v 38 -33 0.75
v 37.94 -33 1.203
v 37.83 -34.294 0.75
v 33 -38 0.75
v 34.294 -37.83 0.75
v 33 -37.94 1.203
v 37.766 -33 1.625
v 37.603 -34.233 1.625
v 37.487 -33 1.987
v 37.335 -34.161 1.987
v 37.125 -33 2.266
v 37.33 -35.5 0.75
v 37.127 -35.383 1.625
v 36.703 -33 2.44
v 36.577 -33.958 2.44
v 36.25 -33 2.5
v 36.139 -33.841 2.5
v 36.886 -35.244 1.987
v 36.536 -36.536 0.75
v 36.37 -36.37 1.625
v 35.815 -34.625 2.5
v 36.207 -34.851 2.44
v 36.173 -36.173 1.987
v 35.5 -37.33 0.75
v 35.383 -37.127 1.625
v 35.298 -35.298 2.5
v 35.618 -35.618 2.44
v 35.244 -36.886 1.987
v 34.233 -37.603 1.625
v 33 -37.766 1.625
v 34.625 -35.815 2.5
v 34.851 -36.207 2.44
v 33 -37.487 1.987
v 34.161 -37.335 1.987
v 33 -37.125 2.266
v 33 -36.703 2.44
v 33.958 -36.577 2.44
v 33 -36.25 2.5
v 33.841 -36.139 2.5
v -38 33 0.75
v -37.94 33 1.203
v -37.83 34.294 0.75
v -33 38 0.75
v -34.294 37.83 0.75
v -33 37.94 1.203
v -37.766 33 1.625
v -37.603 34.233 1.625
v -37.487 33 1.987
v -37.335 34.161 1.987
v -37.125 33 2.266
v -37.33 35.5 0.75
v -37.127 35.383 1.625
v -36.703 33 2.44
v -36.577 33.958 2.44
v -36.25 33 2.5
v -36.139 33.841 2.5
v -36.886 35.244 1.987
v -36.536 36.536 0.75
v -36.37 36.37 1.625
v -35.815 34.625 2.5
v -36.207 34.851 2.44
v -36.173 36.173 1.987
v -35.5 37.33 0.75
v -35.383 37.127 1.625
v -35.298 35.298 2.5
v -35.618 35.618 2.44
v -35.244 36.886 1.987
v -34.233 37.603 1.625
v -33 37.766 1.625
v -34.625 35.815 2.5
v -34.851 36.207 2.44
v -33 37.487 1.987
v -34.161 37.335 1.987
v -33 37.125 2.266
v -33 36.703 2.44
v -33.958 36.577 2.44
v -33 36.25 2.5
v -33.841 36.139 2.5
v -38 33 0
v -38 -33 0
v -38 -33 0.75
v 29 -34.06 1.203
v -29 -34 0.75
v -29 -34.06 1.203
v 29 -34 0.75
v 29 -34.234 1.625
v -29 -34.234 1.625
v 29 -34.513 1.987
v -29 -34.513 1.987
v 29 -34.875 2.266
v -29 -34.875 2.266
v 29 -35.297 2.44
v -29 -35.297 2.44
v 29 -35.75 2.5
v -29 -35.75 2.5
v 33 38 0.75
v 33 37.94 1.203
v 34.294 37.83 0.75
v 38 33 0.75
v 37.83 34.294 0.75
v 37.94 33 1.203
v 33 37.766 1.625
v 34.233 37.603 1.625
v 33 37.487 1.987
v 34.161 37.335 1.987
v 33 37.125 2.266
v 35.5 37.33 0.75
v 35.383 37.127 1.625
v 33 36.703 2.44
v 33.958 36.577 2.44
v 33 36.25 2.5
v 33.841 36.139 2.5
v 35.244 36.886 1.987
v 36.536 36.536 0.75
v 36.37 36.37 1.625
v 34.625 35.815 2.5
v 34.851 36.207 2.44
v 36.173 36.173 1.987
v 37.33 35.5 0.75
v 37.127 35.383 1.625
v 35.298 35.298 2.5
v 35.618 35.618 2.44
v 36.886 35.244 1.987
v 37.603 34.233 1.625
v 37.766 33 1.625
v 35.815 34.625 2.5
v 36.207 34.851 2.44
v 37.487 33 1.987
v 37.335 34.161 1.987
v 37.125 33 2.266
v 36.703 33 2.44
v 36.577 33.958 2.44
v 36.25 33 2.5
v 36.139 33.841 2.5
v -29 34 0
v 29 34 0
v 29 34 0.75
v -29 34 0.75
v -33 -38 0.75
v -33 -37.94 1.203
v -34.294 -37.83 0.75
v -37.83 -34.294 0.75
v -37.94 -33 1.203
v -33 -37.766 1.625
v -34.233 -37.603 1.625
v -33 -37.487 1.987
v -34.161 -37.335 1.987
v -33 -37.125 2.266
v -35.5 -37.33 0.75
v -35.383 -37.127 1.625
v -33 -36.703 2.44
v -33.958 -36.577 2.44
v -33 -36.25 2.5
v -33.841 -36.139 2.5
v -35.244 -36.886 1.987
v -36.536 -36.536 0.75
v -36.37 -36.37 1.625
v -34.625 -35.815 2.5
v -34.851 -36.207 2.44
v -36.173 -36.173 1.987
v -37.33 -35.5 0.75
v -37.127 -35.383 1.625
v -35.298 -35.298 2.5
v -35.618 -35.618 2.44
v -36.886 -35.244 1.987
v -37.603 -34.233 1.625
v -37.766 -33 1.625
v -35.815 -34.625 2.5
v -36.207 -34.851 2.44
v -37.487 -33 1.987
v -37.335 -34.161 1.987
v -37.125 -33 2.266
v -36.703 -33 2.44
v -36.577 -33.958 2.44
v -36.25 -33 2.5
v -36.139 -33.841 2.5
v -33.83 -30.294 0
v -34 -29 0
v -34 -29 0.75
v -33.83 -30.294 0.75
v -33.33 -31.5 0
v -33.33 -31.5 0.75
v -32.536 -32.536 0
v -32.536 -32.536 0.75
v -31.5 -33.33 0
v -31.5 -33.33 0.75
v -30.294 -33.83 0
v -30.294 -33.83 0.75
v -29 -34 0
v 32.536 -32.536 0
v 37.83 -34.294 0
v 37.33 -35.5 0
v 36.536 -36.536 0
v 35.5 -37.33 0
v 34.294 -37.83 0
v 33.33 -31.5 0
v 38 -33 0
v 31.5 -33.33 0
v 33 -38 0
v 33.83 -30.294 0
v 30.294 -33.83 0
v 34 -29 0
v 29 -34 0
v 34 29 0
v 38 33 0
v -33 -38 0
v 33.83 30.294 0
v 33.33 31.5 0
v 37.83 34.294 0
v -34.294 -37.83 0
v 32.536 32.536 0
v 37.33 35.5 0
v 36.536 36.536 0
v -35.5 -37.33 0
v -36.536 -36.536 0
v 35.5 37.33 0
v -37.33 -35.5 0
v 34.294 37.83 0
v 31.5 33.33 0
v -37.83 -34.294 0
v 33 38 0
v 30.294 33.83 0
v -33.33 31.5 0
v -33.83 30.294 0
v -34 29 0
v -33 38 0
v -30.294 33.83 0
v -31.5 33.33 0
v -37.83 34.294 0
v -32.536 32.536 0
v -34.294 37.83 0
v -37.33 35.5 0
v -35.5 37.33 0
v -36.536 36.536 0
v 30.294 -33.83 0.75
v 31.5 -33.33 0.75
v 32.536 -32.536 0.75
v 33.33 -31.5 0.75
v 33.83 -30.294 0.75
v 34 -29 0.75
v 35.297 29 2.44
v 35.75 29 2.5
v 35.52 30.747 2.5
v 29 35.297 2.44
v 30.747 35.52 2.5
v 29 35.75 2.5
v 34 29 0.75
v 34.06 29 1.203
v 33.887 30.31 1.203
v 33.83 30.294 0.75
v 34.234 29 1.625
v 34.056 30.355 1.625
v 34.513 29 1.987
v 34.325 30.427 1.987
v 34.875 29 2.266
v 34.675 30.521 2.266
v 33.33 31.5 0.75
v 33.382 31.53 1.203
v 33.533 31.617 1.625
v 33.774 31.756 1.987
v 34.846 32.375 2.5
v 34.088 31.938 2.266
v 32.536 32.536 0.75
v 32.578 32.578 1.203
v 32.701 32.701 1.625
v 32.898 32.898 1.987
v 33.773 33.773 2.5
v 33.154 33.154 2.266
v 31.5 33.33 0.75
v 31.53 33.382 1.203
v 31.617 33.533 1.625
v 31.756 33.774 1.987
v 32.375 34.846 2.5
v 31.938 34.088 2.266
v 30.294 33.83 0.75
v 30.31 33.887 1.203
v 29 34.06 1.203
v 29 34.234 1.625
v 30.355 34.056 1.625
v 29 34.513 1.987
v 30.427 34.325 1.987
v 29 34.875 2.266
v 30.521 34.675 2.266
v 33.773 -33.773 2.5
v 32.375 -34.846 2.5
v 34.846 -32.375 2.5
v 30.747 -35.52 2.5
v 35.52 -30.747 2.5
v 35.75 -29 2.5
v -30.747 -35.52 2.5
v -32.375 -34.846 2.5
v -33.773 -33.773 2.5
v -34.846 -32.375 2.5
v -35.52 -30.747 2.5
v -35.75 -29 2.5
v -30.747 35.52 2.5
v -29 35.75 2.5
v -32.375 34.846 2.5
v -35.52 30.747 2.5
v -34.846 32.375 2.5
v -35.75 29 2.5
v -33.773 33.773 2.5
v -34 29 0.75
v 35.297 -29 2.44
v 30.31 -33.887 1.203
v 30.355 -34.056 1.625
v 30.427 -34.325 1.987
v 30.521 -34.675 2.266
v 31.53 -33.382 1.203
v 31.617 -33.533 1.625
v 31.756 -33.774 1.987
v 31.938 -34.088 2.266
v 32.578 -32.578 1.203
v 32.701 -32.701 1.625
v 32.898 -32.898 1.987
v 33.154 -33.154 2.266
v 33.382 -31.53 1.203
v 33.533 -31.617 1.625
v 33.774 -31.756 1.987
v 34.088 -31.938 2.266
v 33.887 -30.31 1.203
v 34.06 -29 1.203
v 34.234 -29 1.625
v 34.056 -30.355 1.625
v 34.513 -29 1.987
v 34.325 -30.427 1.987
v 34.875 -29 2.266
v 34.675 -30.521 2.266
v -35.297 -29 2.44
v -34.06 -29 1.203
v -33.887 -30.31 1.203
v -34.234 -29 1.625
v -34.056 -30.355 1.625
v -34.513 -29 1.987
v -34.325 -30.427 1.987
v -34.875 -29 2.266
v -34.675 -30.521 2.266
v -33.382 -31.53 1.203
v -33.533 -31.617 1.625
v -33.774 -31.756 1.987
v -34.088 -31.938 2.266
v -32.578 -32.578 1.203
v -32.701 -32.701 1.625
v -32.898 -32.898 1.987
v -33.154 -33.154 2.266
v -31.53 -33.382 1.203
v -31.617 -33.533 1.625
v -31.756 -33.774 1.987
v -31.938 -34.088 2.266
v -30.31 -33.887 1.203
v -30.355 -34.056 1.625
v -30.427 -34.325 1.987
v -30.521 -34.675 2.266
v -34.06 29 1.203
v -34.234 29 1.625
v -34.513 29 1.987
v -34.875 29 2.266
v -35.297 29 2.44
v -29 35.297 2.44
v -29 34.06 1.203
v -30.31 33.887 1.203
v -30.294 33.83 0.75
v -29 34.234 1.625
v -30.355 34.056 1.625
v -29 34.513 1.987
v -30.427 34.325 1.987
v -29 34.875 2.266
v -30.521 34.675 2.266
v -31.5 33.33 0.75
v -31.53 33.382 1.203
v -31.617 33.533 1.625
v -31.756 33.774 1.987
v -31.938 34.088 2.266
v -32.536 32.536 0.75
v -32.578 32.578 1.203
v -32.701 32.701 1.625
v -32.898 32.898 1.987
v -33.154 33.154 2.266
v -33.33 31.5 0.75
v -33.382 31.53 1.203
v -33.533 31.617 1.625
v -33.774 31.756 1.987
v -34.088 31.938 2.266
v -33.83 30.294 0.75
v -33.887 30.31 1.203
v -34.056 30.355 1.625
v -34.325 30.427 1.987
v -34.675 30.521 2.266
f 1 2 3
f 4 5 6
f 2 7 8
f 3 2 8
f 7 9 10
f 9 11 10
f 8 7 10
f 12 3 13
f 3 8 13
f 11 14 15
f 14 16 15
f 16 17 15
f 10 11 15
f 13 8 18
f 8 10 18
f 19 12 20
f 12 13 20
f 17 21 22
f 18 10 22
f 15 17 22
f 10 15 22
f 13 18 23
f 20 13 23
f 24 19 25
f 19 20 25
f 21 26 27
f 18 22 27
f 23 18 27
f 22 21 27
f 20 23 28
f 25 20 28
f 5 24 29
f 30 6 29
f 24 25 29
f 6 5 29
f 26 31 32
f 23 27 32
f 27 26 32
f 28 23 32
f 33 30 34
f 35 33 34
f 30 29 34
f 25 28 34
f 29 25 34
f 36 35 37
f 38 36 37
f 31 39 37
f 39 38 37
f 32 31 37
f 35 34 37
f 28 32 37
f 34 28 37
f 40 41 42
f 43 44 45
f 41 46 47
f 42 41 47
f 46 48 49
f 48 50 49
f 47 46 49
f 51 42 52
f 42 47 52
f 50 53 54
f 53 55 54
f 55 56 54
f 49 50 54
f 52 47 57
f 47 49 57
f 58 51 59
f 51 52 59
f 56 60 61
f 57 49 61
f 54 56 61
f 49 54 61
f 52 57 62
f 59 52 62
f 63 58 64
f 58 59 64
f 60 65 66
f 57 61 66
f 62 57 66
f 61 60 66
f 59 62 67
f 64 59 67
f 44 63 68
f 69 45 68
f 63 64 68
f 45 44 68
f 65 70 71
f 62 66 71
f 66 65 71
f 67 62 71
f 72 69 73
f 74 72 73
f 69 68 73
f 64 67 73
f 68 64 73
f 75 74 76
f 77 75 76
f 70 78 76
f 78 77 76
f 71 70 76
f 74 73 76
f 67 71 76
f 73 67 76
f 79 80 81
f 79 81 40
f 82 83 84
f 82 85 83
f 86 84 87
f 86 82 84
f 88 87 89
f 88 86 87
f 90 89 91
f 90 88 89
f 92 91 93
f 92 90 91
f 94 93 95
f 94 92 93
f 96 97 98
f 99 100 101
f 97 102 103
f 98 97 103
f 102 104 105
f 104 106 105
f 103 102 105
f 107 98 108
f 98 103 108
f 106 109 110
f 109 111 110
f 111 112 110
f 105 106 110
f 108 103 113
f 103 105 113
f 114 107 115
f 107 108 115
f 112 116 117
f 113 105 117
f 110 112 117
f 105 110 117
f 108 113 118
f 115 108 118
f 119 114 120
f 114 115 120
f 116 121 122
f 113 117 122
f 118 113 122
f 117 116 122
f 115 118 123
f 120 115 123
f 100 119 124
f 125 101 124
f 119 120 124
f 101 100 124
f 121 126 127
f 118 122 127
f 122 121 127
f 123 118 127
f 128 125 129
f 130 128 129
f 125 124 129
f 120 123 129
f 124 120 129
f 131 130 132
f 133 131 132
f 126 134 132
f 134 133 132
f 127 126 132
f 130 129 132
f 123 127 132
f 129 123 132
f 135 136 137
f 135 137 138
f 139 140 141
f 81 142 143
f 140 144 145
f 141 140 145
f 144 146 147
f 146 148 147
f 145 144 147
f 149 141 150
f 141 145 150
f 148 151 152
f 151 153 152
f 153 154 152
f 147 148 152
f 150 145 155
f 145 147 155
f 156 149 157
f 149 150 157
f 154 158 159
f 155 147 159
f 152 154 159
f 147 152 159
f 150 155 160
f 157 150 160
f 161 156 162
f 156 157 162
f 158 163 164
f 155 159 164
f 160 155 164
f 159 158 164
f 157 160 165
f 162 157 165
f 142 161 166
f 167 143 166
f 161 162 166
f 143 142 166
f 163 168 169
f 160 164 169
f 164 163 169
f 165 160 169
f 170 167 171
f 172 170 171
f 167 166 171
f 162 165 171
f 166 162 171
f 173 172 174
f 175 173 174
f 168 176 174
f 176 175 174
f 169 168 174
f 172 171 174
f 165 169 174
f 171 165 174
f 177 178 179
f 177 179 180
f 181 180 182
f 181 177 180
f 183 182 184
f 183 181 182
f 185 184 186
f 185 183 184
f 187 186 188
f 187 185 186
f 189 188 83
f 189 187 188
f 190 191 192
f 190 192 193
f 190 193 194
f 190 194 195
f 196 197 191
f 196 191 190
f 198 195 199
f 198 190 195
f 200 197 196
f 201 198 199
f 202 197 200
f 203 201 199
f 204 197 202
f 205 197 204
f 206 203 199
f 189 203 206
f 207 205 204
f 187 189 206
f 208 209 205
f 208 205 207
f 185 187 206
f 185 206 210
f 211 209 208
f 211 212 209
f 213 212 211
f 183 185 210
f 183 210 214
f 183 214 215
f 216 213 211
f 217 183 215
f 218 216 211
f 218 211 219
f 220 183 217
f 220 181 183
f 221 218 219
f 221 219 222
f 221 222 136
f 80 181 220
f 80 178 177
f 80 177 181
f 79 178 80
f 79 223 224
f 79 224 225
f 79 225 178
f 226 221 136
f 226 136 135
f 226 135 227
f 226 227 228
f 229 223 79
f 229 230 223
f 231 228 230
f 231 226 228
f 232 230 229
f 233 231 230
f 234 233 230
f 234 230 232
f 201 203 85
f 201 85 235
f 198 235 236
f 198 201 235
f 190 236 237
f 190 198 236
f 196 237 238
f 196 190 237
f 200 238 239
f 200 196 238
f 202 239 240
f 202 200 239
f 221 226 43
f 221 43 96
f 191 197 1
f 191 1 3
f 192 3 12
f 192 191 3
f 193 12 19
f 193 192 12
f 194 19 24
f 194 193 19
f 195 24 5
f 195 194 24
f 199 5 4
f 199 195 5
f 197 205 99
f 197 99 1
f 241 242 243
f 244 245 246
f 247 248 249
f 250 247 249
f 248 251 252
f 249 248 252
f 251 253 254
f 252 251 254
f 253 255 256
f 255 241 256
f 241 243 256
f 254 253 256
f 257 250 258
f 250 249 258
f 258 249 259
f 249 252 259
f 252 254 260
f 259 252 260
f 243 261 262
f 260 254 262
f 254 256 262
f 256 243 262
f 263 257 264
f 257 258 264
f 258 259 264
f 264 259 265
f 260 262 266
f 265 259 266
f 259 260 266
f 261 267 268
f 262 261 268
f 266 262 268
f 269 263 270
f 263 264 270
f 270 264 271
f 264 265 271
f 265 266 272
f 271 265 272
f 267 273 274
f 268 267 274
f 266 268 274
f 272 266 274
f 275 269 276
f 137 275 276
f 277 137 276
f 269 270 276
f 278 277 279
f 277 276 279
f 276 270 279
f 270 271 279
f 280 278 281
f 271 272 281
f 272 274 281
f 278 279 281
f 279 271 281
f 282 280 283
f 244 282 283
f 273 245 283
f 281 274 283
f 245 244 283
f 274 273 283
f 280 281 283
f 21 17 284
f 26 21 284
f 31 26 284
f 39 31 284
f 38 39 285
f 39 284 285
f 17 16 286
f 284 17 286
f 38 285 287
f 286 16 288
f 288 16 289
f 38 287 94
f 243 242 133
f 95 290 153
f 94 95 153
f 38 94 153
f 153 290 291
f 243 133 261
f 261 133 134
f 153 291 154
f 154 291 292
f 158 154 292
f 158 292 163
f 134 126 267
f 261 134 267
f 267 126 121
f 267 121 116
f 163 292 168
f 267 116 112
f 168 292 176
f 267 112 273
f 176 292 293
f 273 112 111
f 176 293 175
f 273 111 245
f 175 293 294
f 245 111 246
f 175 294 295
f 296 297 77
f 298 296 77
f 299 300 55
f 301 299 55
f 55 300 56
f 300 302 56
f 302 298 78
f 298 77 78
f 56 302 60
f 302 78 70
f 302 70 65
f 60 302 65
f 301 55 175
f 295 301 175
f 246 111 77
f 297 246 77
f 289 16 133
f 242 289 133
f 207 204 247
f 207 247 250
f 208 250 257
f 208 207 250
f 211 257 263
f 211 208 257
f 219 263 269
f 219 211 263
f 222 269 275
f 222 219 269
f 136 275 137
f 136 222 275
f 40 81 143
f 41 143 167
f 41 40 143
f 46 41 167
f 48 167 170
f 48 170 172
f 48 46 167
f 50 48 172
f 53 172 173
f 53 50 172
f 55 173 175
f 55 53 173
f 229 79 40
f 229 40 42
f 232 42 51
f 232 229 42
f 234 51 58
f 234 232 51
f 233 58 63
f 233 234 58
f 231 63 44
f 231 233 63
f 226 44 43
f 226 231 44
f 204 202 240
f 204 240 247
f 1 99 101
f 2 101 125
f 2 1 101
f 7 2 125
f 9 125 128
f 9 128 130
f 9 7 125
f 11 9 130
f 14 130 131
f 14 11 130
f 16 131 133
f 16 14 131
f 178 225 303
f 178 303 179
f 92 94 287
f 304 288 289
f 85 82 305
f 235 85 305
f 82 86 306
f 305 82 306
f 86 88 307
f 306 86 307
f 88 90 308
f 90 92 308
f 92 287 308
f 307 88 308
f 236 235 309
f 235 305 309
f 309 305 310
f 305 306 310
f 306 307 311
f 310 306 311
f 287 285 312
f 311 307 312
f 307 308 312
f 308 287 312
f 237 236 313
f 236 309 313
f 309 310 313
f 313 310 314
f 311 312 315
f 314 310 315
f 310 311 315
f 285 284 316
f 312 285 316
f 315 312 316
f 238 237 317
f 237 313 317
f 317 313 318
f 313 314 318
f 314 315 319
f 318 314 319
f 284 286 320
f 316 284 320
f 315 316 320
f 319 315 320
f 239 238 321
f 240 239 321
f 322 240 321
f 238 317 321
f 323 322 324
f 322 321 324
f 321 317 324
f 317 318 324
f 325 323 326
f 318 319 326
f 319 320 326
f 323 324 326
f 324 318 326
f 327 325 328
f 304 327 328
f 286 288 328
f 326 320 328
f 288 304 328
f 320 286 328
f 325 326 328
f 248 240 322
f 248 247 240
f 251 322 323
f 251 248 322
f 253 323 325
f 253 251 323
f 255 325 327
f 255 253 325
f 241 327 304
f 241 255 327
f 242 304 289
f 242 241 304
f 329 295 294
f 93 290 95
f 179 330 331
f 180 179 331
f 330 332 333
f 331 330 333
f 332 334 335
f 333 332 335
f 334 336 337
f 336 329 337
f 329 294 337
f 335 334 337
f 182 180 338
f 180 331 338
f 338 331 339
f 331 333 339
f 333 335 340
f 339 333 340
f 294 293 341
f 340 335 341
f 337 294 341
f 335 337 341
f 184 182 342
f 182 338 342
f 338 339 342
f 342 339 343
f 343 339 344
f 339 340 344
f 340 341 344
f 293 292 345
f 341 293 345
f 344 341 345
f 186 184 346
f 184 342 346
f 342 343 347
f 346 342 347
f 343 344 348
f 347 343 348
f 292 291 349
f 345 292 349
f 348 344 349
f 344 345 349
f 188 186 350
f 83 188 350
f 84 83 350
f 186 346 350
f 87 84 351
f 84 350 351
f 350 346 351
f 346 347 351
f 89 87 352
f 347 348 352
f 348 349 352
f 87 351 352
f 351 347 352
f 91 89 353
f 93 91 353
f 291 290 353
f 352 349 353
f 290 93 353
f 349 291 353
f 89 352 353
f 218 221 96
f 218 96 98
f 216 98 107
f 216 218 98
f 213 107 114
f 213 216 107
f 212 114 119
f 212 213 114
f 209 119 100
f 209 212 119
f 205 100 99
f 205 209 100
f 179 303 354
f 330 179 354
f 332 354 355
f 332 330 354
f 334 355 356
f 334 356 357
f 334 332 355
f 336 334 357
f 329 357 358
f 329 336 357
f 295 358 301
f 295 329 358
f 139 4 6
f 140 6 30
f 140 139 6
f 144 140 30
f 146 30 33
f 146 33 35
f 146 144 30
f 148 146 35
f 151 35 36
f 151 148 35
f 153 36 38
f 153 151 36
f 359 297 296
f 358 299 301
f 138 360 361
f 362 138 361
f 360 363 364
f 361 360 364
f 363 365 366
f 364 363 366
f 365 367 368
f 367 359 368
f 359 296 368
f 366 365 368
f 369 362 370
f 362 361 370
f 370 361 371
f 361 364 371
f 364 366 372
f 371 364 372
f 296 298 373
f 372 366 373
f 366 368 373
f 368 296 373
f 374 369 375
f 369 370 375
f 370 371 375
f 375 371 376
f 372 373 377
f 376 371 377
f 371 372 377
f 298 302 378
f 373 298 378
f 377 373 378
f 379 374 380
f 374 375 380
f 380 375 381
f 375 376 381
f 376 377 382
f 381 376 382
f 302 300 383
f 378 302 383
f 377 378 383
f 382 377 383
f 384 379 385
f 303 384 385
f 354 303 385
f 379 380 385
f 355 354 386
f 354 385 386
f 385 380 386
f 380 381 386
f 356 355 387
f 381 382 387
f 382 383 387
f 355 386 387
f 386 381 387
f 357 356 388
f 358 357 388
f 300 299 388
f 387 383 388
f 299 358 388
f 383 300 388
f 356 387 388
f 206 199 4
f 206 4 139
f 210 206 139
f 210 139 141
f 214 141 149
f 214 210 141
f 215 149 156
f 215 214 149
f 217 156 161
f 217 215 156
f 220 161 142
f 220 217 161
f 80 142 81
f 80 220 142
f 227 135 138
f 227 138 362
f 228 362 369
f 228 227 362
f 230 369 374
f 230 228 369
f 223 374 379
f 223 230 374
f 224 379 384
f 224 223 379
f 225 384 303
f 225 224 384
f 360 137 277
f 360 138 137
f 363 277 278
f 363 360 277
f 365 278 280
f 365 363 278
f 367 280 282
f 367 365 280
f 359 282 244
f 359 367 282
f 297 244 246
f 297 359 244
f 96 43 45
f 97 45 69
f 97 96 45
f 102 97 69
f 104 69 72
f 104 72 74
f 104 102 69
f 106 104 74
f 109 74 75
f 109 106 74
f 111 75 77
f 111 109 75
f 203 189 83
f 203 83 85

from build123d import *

# Parameters (mm, degrees)
BOSS_EXTRUDE1_DEPTH = 2.5
FILLET1_R           = 1.75


with BuildPart() as part:
    # Sketch1 → Boss-Extrude1 (new body)
    with BuildSketch(Plane.XY):
        with BuildLine():
            Line((-33, 38), (33, 38))
            ThreePointArc((33, 38), (36.535533906, 36.535533906), (38, 33))
            Line((38, 33), (38, -33))
            ThreePointArc((38, -33), (36.535533906, -36.535533906), (33, -38))
            Line((33, -38), (-33, -38))
            ThreePointArc((-33, -38), (-36.535533906, -36.535533906), (-38, -33))
            Line((-38, -33), (-38, 33))
            ThreePointArc((-38, 33), (-36.535533906, 36.535533906), (-33, 38))
        make_face()
        with BuildLine():
            Line((29, 34), (-29, 34))
            ThreePointArc((-29, 34), (-32.535533906, 32.535533906), (-34, 29))
            Line((-34, 29), (-34, -29))
            ThreePointArc((-34, -29), (-32.535533906, -32.535533906), (-29, -34))
            Line((-29, -34), (29, -34))
            ThreePointArc((29, -34), (32.535533906, -32.535533906), (34, -29))
            Line((34, -29), (34, 29))
            ThreePointArc((34, 29), (32.535533906, 32.535533906), (29, 34))
        make_face(mode=Mode.SUBTRACT)
    extrude(amount=BOSS_EXTRUDE1_DEPTH)

    # Fillet1
    fillet1_edges = [part.edges().sort_by_distance(p)[0] for p in [
        (36.535533906, -36.535533906, 2.5),
        (38, 0, 2.5),
        (36.535533906, 36.535533906, 2.5),
        (0, 38, 2.5),
        (-36.535533906, 36.535533906, 2.5),
        (-38, 0, 2.5),
        (-32.535533906, -32.535533906, 2.5),
        (0, -34, 2.5),
        (32.535533906, -32.535533906, 2.5),
        (34, 0, 2.5),
        (32.535533906, 32.535533906, 2.5),
        (0, 34, 2.5),
        (-32.535533906, 32.535533906, 2.5),
        (-34, 0, 2.5),
        (-36.535533906, -36.535533906, 2.5),
        (0, -38, 2.5),
    ]]
    fillet(fillet1_edges, radius=FILLET1_R)


solid = part.part
